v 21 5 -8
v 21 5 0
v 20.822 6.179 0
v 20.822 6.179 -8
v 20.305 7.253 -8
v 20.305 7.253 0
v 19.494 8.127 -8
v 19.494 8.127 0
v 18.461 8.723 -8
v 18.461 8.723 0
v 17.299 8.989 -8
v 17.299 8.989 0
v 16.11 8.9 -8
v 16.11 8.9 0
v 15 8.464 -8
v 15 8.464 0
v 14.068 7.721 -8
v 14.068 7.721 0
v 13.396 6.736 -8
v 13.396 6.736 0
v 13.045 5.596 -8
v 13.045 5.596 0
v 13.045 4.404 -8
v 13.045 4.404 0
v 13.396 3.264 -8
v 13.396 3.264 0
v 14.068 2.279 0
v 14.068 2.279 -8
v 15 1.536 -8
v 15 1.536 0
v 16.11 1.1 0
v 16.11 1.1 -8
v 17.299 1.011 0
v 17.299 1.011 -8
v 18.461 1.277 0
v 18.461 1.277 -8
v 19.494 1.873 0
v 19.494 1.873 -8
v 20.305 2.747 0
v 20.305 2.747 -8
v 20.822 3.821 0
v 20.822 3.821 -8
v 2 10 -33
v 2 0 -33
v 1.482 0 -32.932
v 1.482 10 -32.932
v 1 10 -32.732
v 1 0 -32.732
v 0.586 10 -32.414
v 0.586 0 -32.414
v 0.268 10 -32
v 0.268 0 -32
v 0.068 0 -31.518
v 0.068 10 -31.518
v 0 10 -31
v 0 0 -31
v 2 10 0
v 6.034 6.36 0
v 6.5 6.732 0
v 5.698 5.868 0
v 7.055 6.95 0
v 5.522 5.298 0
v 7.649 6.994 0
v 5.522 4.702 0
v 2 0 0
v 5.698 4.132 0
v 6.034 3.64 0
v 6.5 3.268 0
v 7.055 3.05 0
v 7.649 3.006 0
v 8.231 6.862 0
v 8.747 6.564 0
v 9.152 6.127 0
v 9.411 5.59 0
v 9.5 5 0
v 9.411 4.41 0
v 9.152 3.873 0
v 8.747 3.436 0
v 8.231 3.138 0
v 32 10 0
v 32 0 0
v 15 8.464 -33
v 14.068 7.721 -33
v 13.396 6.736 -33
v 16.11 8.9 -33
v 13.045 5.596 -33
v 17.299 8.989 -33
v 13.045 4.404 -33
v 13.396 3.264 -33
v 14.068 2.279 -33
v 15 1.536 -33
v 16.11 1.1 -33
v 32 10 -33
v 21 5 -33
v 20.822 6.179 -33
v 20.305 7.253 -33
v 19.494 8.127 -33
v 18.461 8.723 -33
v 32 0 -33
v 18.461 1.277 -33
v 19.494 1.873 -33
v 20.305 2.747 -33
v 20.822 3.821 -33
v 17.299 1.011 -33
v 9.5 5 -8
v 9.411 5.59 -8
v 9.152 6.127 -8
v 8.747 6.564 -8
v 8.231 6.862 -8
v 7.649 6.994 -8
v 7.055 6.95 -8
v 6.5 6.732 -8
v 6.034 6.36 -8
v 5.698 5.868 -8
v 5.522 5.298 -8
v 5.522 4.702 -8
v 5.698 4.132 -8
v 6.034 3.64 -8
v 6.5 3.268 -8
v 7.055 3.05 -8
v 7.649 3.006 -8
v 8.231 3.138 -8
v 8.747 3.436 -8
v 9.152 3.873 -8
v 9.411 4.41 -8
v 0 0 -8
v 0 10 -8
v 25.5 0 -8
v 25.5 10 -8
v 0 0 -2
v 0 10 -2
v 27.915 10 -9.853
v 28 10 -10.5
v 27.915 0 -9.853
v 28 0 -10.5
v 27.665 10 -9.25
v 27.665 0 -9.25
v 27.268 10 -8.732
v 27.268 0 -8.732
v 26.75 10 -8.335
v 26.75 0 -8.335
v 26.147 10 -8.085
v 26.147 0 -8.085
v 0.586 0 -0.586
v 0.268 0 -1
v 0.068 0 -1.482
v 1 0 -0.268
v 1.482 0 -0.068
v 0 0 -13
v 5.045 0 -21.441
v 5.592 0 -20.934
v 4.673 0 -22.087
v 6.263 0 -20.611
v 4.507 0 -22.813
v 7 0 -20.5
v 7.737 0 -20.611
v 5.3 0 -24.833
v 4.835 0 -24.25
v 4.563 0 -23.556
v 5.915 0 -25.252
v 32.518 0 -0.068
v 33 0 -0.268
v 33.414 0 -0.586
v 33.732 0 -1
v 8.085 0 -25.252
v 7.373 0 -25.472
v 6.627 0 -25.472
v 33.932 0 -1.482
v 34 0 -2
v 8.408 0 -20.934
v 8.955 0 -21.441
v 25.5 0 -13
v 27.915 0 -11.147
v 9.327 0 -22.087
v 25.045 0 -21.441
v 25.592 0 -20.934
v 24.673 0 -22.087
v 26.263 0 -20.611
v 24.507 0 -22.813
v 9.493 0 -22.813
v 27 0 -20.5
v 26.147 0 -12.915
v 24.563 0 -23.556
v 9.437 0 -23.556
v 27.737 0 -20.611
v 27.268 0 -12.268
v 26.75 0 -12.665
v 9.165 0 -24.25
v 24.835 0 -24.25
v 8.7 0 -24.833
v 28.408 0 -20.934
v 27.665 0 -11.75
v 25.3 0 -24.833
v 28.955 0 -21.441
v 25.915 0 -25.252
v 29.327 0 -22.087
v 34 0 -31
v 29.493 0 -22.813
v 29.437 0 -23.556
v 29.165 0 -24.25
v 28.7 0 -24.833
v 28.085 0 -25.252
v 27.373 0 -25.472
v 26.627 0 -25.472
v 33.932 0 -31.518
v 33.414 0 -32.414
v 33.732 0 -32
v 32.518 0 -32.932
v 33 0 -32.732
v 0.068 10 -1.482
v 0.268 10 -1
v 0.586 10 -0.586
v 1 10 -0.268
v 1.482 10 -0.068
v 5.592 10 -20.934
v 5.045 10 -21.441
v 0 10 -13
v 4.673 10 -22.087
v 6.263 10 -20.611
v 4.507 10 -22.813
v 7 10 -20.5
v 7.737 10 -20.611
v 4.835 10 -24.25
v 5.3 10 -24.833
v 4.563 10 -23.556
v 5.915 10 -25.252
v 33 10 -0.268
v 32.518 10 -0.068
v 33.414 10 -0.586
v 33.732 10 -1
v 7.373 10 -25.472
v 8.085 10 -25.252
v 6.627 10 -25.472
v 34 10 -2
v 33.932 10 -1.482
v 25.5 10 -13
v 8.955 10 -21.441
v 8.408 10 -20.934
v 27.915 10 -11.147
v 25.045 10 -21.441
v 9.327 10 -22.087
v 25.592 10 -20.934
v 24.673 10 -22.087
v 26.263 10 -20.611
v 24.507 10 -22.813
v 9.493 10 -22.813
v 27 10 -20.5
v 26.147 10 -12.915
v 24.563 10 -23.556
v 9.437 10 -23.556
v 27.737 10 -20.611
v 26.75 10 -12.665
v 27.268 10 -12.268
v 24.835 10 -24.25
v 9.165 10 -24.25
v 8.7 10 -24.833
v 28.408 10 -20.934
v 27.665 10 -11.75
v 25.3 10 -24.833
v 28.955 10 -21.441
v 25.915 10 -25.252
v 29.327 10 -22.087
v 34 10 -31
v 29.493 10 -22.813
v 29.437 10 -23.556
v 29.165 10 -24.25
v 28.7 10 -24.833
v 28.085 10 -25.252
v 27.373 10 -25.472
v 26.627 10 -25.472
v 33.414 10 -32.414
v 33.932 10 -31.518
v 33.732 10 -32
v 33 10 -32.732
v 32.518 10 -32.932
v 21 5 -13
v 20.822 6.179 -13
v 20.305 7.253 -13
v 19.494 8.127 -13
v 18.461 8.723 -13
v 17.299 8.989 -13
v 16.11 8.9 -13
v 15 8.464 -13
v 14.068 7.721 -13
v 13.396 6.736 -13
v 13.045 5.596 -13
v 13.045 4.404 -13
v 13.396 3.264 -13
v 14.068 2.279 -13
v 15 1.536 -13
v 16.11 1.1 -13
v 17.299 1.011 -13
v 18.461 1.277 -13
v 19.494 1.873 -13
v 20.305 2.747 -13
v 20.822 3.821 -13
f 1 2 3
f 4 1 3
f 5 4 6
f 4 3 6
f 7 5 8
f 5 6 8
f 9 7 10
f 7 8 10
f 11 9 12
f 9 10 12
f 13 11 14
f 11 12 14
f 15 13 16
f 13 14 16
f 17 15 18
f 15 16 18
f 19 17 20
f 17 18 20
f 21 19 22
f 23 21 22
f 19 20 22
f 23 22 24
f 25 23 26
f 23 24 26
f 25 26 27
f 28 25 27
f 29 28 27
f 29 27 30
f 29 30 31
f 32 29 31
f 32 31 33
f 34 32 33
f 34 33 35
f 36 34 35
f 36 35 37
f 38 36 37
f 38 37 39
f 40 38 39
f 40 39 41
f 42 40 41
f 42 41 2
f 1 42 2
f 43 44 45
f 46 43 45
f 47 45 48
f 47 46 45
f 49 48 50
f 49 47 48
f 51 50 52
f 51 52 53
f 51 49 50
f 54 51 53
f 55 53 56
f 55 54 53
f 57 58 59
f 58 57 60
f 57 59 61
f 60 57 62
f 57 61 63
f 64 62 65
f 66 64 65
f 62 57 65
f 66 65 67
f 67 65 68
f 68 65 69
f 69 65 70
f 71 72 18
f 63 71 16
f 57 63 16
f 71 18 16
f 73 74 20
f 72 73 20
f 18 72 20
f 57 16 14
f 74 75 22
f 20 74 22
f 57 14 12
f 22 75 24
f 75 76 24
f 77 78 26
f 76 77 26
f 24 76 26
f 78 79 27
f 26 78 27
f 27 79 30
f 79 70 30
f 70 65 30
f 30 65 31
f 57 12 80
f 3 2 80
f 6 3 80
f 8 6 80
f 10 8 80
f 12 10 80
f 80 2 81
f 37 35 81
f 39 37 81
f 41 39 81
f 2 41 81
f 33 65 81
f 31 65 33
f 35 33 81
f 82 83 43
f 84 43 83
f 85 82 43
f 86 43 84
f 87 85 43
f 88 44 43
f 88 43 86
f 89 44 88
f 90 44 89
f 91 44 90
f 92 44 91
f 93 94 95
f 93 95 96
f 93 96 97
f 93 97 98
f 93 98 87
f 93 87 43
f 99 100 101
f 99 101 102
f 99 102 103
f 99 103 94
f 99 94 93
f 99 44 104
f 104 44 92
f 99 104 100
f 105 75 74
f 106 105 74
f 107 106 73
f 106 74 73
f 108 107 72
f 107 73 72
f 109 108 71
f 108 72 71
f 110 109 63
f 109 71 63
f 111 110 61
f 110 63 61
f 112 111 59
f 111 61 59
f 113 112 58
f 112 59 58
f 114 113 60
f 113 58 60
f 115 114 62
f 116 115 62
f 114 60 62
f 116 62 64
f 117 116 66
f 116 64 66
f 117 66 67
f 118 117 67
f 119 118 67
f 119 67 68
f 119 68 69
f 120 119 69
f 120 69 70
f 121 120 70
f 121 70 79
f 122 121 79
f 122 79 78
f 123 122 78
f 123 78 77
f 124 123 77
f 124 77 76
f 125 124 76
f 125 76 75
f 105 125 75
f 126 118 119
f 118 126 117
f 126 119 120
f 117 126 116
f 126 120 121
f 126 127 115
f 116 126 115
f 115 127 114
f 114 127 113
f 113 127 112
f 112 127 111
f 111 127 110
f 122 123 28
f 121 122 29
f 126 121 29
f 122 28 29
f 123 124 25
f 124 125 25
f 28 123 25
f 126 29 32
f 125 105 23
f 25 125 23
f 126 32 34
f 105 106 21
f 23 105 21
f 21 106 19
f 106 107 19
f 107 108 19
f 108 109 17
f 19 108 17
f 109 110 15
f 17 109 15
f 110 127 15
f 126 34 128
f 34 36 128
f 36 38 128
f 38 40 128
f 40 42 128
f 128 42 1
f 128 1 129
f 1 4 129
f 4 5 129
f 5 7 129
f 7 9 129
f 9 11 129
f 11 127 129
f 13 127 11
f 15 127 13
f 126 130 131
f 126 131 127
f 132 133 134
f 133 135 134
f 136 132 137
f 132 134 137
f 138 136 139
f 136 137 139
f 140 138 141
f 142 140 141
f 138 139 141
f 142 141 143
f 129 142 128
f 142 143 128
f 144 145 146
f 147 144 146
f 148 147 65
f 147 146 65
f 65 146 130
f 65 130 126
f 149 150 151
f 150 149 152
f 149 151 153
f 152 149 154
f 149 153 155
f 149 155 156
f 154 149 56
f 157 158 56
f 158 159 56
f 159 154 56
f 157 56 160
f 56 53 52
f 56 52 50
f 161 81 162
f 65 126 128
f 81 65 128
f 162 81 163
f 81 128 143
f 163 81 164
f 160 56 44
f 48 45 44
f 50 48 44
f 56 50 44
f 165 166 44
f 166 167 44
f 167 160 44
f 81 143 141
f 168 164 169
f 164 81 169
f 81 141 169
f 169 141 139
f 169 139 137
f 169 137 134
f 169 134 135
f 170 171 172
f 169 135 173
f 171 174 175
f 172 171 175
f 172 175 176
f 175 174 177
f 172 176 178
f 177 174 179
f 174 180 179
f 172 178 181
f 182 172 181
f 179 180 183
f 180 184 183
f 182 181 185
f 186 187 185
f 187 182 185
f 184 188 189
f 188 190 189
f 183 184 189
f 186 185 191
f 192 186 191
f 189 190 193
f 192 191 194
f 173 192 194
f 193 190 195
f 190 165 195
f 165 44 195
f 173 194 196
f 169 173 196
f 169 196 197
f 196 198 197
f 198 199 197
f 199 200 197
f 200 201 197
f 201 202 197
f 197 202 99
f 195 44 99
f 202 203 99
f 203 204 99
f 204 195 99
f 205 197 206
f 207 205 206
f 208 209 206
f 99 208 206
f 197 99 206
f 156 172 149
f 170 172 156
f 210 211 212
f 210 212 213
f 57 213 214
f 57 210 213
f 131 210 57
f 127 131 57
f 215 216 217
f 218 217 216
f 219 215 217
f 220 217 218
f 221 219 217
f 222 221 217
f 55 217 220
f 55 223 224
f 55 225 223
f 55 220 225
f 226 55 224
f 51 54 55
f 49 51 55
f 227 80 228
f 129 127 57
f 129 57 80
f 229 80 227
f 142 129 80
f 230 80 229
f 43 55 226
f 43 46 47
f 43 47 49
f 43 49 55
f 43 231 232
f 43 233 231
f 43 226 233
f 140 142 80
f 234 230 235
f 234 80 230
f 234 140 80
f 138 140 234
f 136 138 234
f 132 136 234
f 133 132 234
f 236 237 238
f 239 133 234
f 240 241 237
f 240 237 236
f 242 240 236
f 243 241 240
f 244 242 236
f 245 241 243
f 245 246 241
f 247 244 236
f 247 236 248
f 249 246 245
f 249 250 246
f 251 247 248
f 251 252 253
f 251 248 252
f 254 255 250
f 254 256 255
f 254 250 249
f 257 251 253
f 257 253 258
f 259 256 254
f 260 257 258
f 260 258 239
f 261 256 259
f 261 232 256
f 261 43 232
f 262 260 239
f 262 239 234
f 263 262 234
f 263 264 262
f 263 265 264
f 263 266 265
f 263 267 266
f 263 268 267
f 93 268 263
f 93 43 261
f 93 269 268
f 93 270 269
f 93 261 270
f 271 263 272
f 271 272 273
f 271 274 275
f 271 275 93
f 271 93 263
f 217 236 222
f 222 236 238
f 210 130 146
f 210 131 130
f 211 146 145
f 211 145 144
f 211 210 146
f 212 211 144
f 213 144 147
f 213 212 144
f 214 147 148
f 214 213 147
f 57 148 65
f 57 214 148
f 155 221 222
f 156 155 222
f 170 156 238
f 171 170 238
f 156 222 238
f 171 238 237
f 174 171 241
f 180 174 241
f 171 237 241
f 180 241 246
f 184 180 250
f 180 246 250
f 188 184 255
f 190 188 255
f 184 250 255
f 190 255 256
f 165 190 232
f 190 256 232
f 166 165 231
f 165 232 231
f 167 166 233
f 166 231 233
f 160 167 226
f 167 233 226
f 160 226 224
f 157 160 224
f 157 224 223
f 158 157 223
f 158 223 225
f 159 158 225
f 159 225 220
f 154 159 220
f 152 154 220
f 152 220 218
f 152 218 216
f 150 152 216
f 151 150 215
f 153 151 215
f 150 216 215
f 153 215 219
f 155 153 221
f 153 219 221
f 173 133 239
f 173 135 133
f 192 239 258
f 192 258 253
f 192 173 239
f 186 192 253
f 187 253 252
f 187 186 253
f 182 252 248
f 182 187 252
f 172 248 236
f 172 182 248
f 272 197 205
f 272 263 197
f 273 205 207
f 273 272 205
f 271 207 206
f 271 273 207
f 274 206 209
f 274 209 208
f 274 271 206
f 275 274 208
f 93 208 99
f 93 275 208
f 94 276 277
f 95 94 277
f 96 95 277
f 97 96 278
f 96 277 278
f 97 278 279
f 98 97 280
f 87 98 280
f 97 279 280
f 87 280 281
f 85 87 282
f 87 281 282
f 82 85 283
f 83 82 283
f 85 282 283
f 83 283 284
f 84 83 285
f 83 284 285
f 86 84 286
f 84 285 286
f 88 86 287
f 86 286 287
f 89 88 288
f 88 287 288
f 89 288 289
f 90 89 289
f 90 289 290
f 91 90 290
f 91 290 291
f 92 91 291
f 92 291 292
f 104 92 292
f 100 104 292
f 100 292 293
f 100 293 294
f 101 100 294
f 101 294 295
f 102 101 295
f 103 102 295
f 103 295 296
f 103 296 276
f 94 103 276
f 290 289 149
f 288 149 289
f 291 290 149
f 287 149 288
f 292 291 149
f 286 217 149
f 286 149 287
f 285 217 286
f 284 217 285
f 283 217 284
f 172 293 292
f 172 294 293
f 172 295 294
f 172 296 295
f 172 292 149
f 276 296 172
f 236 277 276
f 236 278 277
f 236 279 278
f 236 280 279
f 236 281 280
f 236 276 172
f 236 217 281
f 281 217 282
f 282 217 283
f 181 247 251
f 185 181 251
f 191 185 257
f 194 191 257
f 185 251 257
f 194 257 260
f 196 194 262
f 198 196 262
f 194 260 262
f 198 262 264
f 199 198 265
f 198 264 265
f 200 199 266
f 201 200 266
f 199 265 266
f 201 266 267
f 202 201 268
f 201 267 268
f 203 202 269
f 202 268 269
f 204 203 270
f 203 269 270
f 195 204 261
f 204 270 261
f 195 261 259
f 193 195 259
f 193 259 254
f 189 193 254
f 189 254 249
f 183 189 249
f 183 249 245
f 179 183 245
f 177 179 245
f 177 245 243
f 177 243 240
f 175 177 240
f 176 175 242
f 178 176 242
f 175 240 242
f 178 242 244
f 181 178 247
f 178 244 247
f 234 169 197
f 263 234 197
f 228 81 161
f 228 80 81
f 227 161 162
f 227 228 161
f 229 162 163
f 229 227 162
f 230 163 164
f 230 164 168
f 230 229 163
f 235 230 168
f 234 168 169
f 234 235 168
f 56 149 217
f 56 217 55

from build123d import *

# Parameters (mm, degrees)
SKETCH2_W           = 34
SKETCH2_H           = 33
BOSS_EXTRUDE1_DEPTH = 10
FILLET1_R           = 2
FILLET2_R           = 2
FILLET3_R           = 2
FILLET4_R           = 2
SKETCH3_R           = 2.5
CUT_EXTRUDE1_DEPTH  = 10
SKETCH4_W           = 28
SKETCH4_H           = 5
CUT_EXTRUDE2_DEPTH  = 10
FILLET5_R           = 2.5
FILLET6_R           = 2.5
SKETCH5_R           = 4
CUT_EXTRUDE3_DEPTH  = 60
SKETCH6_R           = 2
CUT_EXTRUDE4_DEPTH  = 10


with BuildPart() as part:
    # Sketch2 → Boss-Extrude1 (new body)
    with BuildSketch(Plane(origin=(0, 0, 0), x_dir=(1, 0, 0), z_dir=(0, 1, 0))):
        with Locations((17, 16.5)):
            Rectangle(SKETCH2_W, SKETCH2_H)
    extrude(amount=BOSS_EXTRUDE1_DEPTH)

    # Fillet1
    fillet1_edges = [part.edges().sort_by_distance(p)[0] for p in [
        (34, 5, 0),
    ]]
    fillet(fillet1_edges, radius=FILLET1_R)

    # Fillet2
    fillet2_edges = [part.edges().sort_by_distance(p)[0] for p in [
        (34, 5, -33),
    ]]
    fillet(fillet2_edges, radius=FILLET2_R)

    # Fillet3
    fillet3_edges = [part.edges().sort_by_distance(p)[0] for p in [
        (0, 5, -33),
    ]]
    fillet(fillet3_edges, radius=FILLET3_R)

    # Fillet4
    fillet4_edges = [part.edges().sort_by_distance(p)[0] for p in [
        (0, 5, 0),
    ]]
    fillet(fillet4_edges, radius=FILLET4_R)

    # Sketch3 → Cut-Extrude1 (cut)
    with BuildSketch(Plane(origin=(0, 10, 0), x_dir=(1, 0, 0), z_dir=(0, 1, 0))):
        with Locations(Location((7, 23, 0), (0, 0, 270))):
            Circle(SKETCH3_R)
        with Locations(Location((27, 23, 0), (0, 0, 270))):
            Circle(SKETCH3_R)
    extrude(amount=-CUT_EXTRUDE1_DEPTH, mode=Mode.SUBTRACT)

    # Sketch4 → Cut-Extrude2 (cut)
    with BuildSketch(Plane(origin=(0, 10, 0), x_dir=(1, 0, 0), z_dir=(0, 1, 0))):
        with Locations((14, 10.5)):
            Rectangle(SKETCH4_W, SKETCH4_H)
    extrude(amount=-CUT_EXTRUDE2_DEPTH, mode=Mode.SUBTRACT)

    # Fillet5
    fillet5_edges = [part.edges().sort_by_distance(p)[0] for p in [
        (28, 5, -13),
    ]]
    fillet(fillet5_edges, radius=FILLET5_R)

    # Fillet6
    fillet6_edges = [part.edges().sort_by_distance(p)[0] for p in [
        (28, 5, -8),
    ]]
    fillet(fillet6_edges, radius=FILLET6_R - 0.0001)  # a hair under: the kernel refuses the full size

    # Sketch5 → Cut-Extrude3 (cut)
    with BuildSketch(Plane.XY):
        with Locations((17, 5)):
            Circle(SKETCH5_R)
    extrude(amount=-CUT_EXTRUDE3_DEPTH, mode=Mode.SUBTRACT)

    # Sketch6 → Cut-Extrude4 (cut)
    with BuildSketch(Plane.XY):
        with Locations((7.5, 5)):
            Circle(SKETCH6_R)
    extrude(amount=-CUT_EXTRUDE4_DEPTH, mode=Mode.SUBTRACT)


solid = part.part
